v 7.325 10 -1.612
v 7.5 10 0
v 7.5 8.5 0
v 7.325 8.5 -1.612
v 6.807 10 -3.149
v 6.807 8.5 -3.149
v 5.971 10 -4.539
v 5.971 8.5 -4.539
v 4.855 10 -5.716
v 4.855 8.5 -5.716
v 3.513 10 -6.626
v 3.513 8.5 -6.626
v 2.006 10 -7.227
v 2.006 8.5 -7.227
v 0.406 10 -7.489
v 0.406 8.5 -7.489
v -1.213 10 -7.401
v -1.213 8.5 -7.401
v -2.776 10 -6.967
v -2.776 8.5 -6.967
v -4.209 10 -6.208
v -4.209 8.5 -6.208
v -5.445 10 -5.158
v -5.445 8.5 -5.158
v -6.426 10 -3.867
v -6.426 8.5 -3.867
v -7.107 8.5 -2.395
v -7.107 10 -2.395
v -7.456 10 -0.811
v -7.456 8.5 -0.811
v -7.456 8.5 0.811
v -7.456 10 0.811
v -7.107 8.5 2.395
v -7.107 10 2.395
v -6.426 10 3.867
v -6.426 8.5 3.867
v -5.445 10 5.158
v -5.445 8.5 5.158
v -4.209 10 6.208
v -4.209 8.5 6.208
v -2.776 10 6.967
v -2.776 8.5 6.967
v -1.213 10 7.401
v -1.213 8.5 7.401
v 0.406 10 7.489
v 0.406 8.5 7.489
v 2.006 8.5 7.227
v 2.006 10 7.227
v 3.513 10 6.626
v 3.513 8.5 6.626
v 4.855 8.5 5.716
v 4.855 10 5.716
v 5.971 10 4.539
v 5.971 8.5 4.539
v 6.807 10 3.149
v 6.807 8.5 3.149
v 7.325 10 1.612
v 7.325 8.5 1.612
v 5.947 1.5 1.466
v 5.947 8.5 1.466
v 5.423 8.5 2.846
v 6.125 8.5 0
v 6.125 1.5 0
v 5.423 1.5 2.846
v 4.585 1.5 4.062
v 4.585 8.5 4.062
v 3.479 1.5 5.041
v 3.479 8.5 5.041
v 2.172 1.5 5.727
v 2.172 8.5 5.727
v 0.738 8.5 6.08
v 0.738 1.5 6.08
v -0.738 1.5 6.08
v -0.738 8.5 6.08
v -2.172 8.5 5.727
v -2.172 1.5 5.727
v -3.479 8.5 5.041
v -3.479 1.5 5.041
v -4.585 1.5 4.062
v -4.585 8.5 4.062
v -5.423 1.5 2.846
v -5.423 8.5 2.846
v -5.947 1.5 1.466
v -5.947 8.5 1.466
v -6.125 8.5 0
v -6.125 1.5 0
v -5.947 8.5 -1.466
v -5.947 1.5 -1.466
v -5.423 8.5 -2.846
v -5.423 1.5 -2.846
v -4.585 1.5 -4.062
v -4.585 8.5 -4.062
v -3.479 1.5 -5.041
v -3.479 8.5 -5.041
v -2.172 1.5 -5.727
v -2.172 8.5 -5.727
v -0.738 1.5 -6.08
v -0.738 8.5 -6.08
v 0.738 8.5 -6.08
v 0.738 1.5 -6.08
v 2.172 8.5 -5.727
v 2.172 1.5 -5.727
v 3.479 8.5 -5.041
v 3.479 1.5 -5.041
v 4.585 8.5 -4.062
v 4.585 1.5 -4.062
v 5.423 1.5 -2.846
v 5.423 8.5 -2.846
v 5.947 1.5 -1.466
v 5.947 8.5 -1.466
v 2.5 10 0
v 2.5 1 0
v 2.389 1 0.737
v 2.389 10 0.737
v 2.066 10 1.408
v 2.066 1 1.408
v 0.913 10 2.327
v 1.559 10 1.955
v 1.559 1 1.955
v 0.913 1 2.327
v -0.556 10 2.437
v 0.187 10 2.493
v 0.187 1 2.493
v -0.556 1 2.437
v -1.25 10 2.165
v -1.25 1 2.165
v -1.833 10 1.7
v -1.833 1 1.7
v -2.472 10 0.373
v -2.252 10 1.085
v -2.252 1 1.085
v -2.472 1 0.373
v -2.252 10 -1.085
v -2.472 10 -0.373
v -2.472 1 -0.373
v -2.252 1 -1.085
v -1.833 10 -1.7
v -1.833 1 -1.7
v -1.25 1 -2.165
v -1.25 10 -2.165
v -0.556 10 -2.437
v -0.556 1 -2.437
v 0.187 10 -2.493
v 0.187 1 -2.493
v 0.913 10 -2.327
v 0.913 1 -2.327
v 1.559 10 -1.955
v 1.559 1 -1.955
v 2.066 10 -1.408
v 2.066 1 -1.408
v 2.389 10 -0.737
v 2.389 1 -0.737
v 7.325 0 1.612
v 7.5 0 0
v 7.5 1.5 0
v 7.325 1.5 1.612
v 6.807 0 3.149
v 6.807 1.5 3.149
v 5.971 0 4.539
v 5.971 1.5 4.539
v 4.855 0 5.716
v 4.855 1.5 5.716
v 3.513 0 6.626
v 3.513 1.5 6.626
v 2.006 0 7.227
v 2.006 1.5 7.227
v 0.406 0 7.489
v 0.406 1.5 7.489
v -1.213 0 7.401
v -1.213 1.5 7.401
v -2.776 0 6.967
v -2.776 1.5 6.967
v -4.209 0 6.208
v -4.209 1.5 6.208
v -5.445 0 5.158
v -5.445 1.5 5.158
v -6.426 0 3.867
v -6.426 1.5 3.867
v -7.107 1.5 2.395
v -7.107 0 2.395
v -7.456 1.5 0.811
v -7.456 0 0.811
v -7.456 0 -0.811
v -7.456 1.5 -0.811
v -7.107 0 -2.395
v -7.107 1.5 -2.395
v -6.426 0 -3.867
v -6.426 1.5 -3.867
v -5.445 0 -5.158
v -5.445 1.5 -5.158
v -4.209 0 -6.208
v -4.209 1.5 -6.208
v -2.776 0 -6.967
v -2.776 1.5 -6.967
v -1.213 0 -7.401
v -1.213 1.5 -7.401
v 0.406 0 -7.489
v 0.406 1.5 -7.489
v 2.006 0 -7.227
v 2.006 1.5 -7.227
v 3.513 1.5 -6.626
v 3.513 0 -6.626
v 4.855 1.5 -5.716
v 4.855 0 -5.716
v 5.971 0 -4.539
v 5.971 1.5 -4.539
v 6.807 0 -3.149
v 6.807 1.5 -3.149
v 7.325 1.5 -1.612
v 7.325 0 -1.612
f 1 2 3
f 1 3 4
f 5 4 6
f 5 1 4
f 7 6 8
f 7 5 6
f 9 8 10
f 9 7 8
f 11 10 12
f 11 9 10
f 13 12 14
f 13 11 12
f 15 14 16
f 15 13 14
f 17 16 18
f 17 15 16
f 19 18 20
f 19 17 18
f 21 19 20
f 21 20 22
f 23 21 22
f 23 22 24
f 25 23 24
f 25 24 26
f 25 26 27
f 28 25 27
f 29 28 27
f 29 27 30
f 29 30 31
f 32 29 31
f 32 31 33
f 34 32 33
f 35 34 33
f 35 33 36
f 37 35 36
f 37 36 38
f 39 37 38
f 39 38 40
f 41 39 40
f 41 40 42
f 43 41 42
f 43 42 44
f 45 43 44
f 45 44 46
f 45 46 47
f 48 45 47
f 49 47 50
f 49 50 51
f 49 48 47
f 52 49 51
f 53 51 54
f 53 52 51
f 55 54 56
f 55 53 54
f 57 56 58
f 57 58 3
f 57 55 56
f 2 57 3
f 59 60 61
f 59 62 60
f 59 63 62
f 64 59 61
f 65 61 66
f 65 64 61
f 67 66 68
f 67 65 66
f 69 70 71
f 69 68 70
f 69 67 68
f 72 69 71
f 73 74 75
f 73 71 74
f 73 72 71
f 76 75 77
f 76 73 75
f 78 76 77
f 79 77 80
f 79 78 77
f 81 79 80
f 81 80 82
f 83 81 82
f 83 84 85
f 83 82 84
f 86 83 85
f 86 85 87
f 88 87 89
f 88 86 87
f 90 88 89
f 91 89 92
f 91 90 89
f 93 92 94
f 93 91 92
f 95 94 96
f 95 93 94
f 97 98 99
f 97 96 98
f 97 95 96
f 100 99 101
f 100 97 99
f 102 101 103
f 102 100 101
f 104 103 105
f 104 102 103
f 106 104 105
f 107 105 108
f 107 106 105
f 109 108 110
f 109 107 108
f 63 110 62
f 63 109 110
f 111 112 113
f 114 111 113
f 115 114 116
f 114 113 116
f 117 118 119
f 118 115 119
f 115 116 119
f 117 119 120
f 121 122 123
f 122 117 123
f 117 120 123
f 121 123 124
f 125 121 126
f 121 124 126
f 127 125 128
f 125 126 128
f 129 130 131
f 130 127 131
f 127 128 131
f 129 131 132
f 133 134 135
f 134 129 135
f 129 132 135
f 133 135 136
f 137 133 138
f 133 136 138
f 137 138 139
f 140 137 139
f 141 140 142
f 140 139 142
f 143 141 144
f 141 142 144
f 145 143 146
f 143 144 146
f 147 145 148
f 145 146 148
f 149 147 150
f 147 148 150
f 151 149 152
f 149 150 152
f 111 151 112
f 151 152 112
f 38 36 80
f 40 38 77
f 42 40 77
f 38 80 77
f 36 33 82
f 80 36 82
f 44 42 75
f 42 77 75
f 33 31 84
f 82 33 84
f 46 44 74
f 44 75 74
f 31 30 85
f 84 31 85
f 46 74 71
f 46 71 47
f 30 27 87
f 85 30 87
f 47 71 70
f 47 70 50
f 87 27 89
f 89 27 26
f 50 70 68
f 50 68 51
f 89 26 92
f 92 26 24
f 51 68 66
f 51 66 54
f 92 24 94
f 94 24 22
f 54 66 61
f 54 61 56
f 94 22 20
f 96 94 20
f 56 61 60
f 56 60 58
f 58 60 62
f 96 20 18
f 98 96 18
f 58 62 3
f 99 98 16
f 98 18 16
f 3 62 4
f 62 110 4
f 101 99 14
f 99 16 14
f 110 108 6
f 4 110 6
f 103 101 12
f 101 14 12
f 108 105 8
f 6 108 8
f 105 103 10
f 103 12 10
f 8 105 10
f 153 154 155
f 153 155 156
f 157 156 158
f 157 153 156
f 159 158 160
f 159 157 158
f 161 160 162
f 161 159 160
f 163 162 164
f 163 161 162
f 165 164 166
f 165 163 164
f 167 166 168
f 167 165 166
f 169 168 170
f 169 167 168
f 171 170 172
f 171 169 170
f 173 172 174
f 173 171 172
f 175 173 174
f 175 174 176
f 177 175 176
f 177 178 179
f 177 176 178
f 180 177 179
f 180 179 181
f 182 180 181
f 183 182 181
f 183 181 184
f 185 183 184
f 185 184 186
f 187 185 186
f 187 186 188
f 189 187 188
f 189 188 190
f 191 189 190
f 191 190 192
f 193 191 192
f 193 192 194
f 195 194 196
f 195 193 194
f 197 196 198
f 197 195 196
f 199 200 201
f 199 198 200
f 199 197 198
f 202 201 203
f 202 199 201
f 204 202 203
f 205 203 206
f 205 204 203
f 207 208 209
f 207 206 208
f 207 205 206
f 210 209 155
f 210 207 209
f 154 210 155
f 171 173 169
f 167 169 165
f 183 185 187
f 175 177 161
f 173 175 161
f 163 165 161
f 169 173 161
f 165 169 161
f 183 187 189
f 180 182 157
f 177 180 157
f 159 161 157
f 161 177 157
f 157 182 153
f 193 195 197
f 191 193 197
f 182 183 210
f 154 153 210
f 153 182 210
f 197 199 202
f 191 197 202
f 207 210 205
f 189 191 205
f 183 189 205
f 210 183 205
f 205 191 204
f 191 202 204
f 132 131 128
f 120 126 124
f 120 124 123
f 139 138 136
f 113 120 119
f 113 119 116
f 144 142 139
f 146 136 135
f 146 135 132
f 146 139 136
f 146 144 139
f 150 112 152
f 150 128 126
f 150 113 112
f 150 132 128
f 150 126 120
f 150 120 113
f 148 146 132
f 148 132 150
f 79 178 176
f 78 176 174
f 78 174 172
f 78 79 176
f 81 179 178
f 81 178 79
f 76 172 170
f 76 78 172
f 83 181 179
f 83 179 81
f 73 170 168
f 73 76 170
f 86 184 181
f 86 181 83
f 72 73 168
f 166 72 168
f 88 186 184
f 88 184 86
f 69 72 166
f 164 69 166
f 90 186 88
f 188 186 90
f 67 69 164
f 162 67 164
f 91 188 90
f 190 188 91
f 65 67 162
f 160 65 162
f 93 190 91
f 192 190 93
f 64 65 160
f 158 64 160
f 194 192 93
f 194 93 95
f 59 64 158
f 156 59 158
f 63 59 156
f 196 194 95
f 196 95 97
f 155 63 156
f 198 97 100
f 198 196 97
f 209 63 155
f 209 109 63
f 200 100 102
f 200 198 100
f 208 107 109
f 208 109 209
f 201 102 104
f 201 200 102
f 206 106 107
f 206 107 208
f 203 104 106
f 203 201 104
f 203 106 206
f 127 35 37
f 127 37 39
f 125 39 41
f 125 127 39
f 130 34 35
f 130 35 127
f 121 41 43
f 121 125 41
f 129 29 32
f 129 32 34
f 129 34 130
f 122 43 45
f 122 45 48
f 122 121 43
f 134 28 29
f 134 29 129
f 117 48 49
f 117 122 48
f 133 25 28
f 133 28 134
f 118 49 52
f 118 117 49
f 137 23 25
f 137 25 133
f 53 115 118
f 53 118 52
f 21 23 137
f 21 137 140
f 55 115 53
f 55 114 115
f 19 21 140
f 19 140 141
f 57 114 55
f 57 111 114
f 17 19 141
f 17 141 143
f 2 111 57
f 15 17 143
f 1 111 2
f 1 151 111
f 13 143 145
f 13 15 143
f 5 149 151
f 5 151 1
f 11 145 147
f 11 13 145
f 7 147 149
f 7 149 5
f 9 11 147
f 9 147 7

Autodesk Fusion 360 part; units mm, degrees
sketch "Sketch1" plane through (0, 0, 0) normal (0, 1, 0) x (1, 0, 0)
  circle A0 centre (0, 0) radius 2.5
  circle A1 centre (0, 0) radius 3.5
  dimension "d1" = 5
  dimension "d2" = 7
extrude "Extrude2" add sketch "Sketch1" along normal blind 1

Autodesk Fusion 360 part; units mm, degrees
sketch "Sketch1" plane through (0, 0, 0) normal (0, 1, 0) x (1, 0, 0)
  circle A0 centre (0, 0) radius 2.5
  circle A1 centre (0, 0) radius 6.125
  circle A2 centre (0, 0) radius 7.5
  dimension "d1" = 5
  dimension "d2" = 12.25
  dimension "d3" = 15
extrude "Extrude1" add sketch "Sketch1" along normal blind 10 contours A1
extrude "Extrude2" add sketch "Sketch1" along normal blind 1.5 contours A2
extrude "Extrude3" add sketch "Sketch1" against normal blind 1.5 from surface at 10 contours A2
